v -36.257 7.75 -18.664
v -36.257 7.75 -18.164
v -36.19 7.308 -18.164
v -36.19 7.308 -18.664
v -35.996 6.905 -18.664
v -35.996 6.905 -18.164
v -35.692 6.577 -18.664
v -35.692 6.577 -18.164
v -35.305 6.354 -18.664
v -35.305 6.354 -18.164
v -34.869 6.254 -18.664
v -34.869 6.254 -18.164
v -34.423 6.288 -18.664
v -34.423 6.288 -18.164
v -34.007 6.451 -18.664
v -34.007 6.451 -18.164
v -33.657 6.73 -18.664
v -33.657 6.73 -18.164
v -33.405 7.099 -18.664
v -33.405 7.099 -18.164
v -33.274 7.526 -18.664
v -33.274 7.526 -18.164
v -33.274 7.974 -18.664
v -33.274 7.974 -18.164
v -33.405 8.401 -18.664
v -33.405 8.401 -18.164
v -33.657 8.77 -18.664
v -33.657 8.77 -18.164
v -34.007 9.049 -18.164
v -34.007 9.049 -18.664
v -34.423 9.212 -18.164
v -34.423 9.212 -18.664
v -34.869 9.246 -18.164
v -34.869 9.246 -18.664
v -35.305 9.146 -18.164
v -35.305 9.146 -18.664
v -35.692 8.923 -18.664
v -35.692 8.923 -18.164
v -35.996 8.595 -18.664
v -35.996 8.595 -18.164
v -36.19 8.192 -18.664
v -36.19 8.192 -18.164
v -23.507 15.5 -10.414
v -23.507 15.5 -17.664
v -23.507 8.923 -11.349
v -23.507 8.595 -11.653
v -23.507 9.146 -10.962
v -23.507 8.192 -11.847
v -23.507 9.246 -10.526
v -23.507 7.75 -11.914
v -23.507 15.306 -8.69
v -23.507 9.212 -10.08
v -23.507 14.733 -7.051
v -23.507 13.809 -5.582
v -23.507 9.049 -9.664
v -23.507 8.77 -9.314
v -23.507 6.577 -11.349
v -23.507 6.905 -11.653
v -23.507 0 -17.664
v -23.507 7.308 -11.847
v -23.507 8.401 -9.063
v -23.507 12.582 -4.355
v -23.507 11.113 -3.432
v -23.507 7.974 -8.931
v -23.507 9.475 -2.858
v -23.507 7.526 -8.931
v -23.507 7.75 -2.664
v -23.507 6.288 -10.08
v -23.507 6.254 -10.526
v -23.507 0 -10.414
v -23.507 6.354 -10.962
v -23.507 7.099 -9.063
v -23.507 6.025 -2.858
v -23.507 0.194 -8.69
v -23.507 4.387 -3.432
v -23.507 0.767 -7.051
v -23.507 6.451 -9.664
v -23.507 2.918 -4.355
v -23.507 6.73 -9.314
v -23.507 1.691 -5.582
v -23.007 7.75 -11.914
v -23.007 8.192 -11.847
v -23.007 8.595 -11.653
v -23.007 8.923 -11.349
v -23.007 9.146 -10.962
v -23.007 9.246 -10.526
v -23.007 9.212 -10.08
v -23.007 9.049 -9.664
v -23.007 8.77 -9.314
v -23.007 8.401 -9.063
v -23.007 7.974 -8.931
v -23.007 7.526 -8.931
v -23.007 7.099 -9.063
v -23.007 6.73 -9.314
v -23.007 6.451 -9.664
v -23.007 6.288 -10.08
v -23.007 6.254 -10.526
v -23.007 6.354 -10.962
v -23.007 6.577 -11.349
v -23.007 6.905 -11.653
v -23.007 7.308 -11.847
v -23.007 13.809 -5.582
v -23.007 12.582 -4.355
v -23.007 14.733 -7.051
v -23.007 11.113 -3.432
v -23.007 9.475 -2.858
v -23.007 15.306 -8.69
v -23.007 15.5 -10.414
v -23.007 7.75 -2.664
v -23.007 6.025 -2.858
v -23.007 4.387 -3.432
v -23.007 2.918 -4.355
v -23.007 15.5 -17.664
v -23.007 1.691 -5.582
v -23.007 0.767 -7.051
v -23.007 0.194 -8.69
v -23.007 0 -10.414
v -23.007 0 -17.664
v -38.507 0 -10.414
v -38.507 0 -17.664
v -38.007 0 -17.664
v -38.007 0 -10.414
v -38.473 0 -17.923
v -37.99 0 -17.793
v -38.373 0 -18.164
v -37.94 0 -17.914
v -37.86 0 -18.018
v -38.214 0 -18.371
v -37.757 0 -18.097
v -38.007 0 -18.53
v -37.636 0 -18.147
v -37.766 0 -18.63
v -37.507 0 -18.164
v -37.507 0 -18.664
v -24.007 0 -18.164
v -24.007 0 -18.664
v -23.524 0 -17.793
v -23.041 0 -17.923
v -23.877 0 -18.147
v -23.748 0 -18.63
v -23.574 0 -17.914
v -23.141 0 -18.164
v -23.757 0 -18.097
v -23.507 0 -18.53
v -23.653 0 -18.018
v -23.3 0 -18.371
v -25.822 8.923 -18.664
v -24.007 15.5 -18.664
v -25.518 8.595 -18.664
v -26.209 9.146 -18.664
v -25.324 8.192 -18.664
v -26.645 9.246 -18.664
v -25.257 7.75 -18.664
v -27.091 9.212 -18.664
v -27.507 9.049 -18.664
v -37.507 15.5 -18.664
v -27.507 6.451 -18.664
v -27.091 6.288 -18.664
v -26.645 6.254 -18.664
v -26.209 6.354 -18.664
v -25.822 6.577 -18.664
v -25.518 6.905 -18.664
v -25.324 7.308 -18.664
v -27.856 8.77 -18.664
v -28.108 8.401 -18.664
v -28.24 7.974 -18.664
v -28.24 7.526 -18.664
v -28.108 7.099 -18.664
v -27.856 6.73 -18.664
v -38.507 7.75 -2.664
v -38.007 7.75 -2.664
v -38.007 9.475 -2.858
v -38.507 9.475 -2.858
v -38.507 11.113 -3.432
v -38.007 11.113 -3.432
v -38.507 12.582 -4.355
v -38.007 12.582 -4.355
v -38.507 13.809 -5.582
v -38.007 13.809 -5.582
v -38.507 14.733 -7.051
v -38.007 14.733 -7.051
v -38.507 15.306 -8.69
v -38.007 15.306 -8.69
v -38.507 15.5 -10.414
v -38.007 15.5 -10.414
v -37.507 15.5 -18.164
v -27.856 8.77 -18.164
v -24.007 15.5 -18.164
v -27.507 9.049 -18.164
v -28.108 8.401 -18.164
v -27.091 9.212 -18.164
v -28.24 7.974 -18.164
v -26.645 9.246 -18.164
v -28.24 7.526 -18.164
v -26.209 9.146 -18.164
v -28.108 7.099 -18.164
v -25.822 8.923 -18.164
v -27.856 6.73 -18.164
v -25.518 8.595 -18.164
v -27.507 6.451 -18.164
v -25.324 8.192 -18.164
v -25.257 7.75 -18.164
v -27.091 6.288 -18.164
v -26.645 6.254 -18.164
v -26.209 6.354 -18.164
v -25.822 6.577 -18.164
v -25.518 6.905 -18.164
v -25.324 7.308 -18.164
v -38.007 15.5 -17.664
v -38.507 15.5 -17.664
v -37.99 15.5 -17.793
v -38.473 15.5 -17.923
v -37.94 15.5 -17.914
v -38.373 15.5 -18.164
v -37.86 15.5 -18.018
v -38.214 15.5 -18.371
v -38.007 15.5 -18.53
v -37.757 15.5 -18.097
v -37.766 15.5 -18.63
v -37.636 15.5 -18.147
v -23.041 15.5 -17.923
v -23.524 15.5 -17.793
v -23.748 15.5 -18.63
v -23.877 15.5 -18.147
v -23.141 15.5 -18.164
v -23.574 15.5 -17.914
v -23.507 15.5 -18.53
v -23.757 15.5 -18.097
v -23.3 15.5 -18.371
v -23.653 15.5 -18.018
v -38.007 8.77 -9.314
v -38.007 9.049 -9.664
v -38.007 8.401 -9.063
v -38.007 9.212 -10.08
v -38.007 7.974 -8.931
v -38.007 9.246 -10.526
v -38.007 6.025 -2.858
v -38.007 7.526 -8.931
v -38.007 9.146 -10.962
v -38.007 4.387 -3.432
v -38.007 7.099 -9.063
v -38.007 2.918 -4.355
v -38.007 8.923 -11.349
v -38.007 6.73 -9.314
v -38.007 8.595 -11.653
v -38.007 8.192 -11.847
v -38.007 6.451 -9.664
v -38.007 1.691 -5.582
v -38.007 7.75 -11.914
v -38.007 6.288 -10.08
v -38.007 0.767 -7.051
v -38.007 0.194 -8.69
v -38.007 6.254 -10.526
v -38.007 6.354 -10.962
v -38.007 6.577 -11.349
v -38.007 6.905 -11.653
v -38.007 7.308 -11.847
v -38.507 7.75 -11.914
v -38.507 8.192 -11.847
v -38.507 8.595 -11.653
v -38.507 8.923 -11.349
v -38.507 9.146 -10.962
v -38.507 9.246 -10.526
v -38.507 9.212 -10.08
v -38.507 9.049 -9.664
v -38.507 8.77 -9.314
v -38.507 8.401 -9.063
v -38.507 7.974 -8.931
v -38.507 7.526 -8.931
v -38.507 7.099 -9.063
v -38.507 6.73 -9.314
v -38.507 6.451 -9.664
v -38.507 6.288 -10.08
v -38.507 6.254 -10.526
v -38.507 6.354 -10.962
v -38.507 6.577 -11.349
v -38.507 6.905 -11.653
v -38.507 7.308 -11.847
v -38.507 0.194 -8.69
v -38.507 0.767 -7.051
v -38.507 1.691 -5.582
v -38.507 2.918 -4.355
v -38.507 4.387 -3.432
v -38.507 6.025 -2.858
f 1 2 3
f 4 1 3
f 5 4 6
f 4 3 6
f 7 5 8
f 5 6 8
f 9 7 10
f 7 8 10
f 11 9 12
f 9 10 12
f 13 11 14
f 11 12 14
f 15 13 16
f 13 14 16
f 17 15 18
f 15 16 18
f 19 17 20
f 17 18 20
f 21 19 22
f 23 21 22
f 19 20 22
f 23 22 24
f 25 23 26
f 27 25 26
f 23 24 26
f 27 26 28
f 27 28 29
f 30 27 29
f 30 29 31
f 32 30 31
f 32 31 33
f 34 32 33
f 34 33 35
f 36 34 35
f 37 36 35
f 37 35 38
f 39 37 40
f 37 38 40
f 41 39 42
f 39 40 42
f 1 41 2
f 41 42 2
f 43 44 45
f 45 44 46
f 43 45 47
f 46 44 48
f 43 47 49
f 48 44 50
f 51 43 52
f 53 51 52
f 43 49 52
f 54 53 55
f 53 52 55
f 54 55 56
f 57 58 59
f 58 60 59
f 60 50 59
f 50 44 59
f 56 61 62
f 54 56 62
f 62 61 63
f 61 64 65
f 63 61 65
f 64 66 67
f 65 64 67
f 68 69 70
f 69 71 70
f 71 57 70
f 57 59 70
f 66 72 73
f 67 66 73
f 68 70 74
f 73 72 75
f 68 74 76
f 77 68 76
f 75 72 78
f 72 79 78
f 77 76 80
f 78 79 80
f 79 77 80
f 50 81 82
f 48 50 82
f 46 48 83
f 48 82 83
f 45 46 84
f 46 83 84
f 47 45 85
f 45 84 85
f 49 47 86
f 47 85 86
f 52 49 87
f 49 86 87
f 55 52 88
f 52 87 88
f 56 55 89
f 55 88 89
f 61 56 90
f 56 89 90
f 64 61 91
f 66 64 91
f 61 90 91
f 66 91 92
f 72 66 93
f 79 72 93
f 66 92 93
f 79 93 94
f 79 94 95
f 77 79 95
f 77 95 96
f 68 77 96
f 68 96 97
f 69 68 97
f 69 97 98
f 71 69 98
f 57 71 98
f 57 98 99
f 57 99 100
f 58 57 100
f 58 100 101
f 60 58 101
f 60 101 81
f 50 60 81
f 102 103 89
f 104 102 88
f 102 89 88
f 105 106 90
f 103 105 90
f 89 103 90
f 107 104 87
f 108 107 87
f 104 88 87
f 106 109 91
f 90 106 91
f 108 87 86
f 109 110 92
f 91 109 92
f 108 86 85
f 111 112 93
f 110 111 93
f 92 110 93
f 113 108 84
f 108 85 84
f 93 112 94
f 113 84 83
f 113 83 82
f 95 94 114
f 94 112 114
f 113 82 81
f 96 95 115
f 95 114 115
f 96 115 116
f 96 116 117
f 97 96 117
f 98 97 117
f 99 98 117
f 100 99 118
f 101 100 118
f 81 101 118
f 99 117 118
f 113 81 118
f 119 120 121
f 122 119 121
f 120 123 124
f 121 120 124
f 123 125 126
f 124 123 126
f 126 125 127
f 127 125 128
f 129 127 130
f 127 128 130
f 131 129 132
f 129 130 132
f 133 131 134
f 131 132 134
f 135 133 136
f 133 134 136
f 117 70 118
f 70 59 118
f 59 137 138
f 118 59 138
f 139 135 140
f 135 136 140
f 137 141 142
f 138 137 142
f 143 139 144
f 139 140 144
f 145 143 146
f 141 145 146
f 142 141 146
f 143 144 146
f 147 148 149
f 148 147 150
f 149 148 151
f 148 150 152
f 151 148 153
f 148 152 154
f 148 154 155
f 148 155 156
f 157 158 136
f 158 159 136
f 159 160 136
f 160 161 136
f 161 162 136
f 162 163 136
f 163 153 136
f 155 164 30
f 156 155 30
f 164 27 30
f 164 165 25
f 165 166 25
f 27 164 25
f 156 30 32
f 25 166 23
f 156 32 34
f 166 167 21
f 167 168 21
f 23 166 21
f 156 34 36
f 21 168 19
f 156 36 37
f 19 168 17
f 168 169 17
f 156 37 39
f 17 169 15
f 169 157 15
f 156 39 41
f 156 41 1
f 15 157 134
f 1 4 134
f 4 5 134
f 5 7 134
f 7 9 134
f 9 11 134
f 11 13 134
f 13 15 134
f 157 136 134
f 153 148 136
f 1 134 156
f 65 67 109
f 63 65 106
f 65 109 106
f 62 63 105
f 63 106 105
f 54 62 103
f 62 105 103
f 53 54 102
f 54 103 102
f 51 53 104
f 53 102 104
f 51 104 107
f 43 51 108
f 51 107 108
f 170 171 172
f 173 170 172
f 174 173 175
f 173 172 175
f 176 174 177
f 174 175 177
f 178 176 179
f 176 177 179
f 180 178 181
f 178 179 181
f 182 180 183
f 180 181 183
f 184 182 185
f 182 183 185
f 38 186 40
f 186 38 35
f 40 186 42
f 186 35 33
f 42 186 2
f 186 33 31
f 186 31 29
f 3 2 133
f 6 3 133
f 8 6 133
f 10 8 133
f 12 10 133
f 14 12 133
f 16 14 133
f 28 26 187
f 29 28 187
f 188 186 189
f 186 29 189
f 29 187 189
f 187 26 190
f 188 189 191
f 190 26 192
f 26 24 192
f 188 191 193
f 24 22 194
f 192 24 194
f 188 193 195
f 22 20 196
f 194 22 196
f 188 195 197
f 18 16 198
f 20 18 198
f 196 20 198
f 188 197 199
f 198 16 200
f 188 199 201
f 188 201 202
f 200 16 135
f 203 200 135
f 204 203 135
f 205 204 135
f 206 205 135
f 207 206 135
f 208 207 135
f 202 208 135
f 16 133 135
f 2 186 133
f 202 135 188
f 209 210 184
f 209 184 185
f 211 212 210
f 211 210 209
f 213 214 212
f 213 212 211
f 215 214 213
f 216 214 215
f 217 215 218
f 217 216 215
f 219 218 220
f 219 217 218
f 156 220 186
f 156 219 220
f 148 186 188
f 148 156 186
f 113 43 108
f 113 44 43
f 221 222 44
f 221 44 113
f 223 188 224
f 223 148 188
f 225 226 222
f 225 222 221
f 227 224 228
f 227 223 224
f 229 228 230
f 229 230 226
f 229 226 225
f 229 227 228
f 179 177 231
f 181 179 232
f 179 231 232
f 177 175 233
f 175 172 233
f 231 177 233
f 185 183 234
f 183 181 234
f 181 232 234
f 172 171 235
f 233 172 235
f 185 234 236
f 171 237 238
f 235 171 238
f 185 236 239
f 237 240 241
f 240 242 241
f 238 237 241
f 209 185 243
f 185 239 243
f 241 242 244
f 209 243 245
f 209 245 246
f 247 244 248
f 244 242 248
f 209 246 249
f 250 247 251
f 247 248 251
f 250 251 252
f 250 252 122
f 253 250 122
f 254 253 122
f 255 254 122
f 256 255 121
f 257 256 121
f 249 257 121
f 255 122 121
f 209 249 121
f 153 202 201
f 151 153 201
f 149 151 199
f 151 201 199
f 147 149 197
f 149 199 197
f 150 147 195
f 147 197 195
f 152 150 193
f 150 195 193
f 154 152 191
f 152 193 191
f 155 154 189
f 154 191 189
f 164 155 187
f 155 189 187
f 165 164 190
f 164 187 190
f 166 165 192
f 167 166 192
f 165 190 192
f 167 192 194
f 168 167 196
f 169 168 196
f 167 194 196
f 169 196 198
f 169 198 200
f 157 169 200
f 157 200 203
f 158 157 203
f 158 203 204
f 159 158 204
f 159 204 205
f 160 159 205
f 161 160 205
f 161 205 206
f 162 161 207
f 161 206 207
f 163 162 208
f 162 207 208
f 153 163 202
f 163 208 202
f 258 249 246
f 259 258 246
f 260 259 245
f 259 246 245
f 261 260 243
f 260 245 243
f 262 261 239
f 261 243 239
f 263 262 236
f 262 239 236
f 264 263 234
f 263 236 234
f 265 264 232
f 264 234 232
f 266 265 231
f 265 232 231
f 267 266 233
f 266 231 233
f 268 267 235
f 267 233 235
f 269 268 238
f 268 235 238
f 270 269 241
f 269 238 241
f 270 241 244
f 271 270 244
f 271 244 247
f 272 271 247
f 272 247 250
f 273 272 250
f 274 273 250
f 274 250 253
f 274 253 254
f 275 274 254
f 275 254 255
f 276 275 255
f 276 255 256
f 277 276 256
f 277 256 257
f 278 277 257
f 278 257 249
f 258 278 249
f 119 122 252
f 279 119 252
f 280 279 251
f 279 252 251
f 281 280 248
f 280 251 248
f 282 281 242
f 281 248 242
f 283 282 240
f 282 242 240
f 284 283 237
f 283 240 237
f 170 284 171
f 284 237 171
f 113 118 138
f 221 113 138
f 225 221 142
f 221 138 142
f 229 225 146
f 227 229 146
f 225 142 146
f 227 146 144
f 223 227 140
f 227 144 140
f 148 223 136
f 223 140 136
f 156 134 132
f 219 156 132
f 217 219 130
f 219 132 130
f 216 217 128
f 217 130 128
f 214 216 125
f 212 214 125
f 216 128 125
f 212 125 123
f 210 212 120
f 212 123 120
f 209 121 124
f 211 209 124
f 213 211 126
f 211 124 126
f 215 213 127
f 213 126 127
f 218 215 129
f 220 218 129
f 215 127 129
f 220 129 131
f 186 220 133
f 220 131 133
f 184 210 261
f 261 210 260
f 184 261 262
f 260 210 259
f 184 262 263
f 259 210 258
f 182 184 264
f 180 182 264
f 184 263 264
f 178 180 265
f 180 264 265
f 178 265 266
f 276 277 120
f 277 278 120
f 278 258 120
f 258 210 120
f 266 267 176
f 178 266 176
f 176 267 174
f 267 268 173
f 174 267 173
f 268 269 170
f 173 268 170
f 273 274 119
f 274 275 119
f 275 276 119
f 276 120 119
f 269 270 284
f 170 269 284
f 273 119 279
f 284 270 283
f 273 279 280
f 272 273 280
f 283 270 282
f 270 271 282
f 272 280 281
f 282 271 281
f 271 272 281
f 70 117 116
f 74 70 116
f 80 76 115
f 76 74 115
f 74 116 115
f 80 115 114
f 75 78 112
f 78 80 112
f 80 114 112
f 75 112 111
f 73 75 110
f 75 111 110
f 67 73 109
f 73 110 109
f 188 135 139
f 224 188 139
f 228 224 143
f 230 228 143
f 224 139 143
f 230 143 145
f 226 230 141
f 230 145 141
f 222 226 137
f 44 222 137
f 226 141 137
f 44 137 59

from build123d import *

# Parameters (mm, degrees)
BRIDA_BASE1_DEPTH     = 15.5
CROQUIS5_R            = 1.5
CORTAR_EXTRUIR1_DEPTH = 29.789695
CROQUIS6_R            = 1.5
CORTAR_EXTRUIR2_DEPTH = 0.5


# Sheet-metal steps are written as plain solids
with BuildPart() as part:
    # Croquis1 → Brida base1 (new body)
    with BuildSketch(Plane(origin=(0, 0, 0), x_dir=(1, 0, 0), z_dir=(0, 1, 0))):
        with BuildLine():
            Line((-23.006869712, 2.664043993), (-23.006869712, 17.664043993))
            ThreePointArc((-23.006869712, 17.664043993), (-23.299762931, 18.371150774), (-24.006869712, 18.664043993))
            Line((-24.006869712, 18.664043993), (-37.506869712, 18.664043993))
            ThreePointArc((-37.506869712, 18.664043993), (-38.213976494, 18.371150774), (-38.506869712, 17.664043993))
            Line((-38.506869712, 17.664043993), (-38.506869712, 2.664043993))
            Line((-38.506869712, 2.664043993), (-38.006869712, 2.664043993))
            Line((-38.006869712, 2.664043993), (-38.006869712, 17.664043993))
            ThreePointArc((-38.006869712, 17.664043993), (-37.860423103, 18.017597384), (-37.506869712, 18.164043993))
            Line((-37.506869712, 18.164043993), (-24.006869712, 18.164043993))
            ThreePointArc((-24.006869712, 18.164043993), (-23.653316322, 18.017597384), (-23.506869712, 17.664043993))
            Line((-23.506869712, 17.664043993), (-23.506869712, 2.664043993))
            Line((-23.506869712, 2.664043993), (-23.006869712, 2.664043993))
        make_face()
    extrude(amount=BRIDA_BASE1_DEPTH)

    # Croquis5 → Cortar-Extruir1 (cut, through all)
    with BuildSketch(Plane(origin=(-23.006869712, 0, 0), x_dir=(0, 0, -1), z_dir=(1, 0, 0))):
        with BuildLine():
            ThreePointArc((2.664043993, 7.75), (4.933966439, 13.230077554), (10.414043993, 15.5))
            Line((10.414043993, 15.5), (2.664043993, 15.5))
            Line((2.664043993, 15.5), (2.664043993, 7.75))
        make_face()
        with BuildLine():
            ThreePointArc((10.414043993, 0), (4.933966439, 2.269922446), (2.664043993, 7.75))
            Line((2.664043993, 7.75), (2.664043993, 0))
            Line((2.664043993, 0), (10.414043993, 0))
        make_face()
        with Locations((10.414043993, 7.75)):
            Circle(CROQUIS5_R)
    extrude(amount=-CORTAR_EXTRUIR1_DEPTH, mode=Mode.SUBTRACT)

    # Croquis6 → Cortar-Extruir2 (cut)
    with BuildSketch(Plane.XY.offset(-18.164043993)):
        with Locations((-26.756869712, 7.75)):
            Circle(CROQUIS6_R)
        with Locations(Location((-34.756869712, 7.75, 0), (0, 0, 180))):
            Circle(CROQUIS6_R)
    extrude(amount=-CORTAR_EXTRUIR2_DEPTH, mode=Mode.SUBTRACT)


solid = part.part
